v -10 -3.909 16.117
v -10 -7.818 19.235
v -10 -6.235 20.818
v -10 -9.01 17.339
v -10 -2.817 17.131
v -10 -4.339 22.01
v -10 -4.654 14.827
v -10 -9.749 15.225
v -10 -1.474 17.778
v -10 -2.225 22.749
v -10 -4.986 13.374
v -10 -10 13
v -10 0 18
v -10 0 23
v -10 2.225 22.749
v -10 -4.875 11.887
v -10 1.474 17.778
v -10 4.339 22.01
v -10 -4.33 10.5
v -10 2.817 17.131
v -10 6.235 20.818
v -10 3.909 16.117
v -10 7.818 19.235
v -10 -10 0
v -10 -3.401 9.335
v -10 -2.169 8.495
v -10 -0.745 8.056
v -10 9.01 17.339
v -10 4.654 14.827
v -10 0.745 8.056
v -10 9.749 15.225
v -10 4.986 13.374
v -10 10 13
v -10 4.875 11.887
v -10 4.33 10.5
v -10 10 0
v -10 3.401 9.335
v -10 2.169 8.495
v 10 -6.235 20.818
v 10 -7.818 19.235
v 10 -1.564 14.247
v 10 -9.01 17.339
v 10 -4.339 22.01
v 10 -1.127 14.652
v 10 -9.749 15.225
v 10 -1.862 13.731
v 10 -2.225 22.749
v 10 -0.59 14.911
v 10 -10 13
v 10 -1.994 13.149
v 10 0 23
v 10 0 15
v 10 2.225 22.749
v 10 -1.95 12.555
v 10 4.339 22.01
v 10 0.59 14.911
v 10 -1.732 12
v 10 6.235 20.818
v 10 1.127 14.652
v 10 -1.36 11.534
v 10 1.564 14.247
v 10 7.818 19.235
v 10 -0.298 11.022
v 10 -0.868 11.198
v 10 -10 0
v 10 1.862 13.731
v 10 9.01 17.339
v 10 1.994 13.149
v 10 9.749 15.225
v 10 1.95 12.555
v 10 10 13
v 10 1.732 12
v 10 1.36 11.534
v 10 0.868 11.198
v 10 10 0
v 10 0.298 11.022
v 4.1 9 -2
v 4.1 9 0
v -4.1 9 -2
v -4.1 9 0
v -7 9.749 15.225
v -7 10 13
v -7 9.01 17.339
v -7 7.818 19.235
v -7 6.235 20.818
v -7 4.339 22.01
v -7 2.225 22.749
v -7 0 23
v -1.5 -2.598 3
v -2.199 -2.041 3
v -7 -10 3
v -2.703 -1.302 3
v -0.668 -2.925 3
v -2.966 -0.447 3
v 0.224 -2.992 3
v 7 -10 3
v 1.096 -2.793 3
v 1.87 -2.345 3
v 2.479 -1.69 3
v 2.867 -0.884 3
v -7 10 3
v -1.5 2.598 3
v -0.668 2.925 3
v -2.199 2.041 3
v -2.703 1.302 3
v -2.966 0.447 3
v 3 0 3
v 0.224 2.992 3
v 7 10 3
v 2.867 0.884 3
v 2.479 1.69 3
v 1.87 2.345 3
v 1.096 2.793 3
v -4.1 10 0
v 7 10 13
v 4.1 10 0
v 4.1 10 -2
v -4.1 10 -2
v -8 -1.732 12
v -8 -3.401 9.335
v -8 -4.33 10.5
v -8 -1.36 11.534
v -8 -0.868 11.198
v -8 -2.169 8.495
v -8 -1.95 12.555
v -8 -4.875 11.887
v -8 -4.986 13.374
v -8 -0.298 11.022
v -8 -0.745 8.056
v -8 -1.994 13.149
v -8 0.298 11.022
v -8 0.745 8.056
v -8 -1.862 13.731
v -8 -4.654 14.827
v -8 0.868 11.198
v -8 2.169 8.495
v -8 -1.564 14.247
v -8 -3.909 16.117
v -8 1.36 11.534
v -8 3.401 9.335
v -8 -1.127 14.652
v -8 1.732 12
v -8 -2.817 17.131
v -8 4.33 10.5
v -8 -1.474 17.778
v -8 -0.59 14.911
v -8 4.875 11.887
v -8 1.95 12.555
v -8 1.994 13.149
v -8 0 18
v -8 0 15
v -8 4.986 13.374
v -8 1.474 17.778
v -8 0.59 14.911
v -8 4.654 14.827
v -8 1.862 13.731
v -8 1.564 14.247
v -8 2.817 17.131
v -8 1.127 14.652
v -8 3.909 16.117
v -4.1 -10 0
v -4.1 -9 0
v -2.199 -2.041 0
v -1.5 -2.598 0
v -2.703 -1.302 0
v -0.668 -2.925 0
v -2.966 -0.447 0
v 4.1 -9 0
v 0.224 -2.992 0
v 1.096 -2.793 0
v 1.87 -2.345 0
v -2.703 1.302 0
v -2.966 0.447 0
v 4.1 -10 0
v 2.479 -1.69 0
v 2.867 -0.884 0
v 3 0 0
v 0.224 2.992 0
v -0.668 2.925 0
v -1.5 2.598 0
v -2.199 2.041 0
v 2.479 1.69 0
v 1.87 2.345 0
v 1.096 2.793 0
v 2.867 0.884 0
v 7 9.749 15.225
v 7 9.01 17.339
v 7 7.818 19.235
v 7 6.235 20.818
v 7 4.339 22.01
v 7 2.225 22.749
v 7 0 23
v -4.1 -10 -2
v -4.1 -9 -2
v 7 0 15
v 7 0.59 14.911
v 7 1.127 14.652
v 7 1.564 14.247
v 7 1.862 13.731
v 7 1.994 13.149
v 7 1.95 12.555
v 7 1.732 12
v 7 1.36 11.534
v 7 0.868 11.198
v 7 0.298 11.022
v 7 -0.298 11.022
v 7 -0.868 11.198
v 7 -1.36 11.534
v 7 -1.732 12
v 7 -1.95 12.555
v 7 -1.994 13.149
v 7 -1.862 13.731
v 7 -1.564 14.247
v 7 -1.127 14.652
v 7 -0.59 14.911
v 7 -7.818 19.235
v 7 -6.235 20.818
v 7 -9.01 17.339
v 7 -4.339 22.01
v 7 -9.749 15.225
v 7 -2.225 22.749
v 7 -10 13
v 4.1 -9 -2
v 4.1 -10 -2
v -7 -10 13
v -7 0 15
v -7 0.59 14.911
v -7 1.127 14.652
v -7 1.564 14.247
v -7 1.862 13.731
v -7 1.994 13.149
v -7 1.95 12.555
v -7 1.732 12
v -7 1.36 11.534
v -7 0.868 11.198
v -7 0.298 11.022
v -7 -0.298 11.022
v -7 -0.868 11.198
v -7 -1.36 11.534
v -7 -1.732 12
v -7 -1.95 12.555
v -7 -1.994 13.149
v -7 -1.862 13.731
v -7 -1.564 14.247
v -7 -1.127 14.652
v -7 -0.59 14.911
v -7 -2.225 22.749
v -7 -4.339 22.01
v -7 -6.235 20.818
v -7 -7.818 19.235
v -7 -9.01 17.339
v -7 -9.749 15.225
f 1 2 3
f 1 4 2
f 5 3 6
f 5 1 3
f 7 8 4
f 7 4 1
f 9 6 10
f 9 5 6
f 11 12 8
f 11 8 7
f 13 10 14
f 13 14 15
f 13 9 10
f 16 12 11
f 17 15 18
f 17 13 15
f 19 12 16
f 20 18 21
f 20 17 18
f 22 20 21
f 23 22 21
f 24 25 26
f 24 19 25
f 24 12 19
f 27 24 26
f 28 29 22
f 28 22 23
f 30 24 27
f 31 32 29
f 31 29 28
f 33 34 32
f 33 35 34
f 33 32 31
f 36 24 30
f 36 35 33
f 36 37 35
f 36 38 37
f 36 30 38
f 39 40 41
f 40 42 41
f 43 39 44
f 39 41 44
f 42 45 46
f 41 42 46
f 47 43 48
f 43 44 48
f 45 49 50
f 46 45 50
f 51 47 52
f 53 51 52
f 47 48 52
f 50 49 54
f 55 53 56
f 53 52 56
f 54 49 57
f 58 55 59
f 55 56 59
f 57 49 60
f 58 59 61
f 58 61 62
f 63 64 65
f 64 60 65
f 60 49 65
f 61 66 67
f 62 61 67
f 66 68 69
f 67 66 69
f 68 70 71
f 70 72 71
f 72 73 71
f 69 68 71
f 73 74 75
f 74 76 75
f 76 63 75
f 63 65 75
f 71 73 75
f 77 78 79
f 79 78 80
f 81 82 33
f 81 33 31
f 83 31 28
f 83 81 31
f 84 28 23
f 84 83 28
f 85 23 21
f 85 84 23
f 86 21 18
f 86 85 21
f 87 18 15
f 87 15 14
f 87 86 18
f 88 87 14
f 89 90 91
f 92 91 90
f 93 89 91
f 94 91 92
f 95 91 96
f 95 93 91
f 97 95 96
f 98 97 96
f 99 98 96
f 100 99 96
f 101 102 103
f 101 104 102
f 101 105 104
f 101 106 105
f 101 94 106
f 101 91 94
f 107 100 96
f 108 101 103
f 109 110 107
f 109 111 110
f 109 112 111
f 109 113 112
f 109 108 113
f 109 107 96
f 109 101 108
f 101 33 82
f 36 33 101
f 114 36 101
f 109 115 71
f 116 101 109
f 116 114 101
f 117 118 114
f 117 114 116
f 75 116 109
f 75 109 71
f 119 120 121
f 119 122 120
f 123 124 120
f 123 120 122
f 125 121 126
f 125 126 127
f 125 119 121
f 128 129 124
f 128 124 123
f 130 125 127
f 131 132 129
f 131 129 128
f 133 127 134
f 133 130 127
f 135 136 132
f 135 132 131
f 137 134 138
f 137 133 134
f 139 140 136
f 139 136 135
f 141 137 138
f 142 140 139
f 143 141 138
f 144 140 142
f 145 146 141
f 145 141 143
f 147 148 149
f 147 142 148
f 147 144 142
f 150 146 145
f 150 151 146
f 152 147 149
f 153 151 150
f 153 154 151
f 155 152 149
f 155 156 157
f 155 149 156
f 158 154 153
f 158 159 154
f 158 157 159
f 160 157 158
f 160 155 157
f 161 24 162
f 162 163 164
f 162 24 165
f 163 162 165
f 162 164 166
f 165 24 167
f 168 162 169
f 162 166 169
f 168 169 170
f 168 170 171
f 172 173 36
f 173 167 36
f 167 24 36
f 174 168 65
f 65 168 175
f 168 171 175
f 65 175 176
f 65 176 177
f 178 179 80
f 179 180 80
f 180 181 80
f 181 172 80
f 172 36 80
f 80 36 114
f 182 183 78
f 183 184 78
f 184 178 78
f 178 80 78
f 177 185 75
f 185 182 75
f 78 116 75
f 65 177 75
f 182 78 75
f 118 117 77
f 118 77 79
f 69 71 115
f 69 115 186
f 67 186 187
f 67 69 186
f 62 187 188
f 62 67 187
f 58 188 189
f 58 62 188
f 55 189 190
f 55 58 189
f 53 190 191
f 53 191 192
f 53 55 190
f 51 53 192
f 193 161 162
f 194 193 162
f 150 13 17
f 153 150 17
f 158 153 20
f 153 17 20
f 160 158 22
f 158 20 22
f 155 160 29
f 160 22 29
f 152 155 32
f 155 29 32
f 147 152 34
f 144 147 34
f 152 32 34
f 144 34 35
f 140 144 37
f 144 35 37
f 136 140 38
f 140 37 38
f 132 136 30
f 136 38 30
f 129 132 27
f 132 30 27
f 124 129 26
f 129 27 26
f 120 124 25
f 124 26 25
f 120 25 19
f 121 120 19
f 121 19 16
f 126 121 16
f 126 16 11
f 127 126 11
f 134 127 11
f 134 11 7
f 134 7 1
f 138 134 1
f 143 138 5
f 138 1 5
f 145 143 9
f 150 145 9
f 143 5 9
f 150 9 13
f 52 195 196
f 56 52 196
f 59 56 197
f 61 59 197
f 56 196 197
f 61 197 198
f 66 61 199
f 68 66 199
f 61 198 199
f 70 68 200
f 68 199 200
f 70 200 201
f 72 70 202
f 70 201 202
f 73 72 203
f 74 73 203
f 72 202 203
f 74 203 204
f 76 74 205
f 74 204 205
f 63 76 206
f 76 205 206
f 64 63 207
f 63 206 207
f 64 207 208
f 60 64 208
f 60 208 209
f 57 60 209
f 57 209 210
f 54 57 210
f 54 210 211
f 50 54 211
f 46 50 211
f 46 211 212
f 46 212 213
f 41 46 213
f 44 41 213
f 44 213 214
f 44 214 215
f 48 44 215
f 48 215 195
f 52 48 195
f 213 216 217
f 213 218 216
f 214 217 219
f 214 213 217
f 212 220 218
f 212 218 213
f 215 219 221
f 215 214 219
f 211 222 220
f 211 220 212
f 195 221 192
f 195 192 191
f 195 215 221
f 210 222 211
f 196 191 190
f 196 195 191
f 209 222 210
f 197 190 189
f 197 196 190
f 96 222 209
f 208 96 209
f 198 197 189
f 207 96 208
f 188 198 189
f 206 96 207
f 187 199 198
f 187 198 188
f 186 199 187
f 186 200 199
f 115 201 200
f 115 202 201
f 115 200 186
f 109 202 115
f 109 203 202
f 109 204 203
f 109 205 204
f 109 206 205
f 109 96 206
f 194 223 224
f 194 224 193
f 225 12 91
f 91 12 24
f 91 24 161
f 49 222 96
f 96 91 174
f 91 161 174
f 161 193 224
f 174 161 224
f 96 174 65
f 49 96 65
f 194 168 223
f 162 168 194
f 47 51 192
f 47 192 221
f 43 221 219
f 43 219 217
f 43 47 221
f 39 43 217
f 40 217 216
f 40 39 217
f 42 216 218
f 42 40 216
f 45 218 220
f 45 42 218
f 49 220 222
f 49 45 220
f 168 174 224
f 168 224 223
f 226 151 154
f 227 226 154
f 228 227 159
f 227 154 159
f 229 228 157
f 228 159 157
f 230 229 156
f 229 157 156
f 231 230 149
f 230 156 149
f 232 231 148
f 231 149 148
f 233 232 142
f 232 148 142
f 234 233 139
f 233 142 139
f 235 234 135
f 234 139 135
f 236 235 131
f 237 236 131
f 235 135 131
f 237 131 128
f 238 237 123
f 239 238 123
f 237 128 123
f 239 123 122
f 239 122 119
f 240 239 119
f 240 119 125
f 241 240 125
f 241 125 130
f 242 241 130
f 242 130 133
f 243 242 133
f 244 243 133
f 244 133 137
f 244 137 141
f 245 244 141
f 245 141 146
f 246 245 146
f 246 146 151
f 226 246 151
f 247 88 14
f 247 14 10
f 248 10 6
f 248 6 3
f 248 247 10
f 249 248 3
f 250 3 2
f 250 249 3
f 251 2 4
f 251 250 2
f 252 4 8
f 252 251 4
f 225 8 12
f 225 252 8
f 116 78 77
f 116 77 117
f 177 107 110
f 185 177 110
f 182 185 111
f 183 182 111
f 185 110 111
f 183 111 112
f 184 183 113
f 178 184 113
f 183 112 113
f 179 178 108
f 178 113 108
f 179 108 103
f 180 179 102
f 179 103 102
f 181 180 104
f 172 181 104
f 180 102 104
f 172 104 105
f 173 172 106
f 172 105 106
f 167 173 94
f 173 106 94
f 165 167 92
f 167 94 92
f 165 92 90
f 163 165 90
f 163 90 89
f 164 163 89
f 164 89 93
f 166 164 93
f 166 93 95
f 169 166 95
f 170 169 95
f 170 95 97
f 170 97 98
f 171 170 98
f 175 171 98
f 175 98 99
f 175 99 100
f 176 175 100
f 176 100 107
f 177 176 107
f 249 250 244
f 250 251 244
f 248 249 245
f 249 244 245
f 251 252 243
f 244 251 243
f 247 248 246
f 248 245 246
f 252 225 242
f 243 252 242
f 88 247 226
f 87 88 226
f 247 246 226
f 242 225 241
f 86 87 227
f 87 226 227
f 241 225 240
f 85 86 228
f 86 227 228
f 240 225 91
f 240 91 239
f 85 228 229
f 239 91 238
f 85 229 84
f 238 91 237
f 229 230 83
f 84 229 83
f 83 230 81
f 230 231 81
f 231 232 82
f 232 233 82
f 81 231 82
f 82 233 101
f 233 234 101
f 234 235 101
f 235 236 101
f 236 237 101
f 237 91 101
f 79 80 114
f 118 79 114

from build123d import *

# Parameters (mm, degrees)
SKETCH_1_W          = 20
SKETCH_1_H          = 20
EXTRUDE_1_DEPTH     = 3
SKETCH_2_W          = 3
SKETCH_2_H          = 20
EXTRUDE_2_DEPTH     = 20
CUT_EXTRUDE_START   = -20
CUT_EXTRUDE_2_DEPTH = 20
SKETCH_4_R          = 2
CUT_EXTRUDE_3_DEPTH = 33.078029865
SKETCH_5_R          = 5
CUT_EXTRUDE_4_DEPTH = 2
SKETCH_6_R          = 3
CUT_EXTRUDE_5_DEPTH = 25.494897428
SKETCH_7_W          = 8.2
SKETCH_7_H          = 1
EXTRUDE_3_DEPTH     = 2


# Read off the part's stored shape, not the designer's step: 切除-拉伸2
with BuildPart() as part:
    # 草图1 → 凸台-拉伸1 (new body)
    with BuildSketch(Plane.XY):
        Rectangle(SKETCH_1_W, SKETCH_1_H)
    extrude(amount=EXTRUDE_1_DEPTH)

    # 草图2 → 凸台-拉伸2 (add)
    with BuildSketch(Plane.XY.offset(3)):
        with Locations((-8.5, 0)):
            Rectangle(SKETCH_2_W, SKETCH_2_H)
        with Locations((8.5, 0)):
            Rectangle(SKETCH_2_W, SKETCH_2_H)
    extrude(amount=EXTRUDE_2_DEPTH)

    # 切除-拉伸2 outline → 切除-拉伸2 (cut)
    with BuildSketch(Plane.ZY.offset(10).offset(CUT_EXTRUDE_START)):
        with BuildLine():
            Line((23, 10), (13, 10))
            ThreePointArc((13, 10), (20.071067812, 7.071067812), (23, 0))
            Line((23, 0), (23, 10))
        make_face()
        with BuildLine():
            Line((23, -10), (23, 0))
            ThreePointArc((23, 0), (20.071067812, -7.071067812), (13, -10))
            Line((13, -10), (23, -10))
        make_face()
    extrude(amount=CUT_EXTRUDE_2_DEPTH, mode=Mode.SUBTRACT)

    # 草图4 → 切除-拉伸3 (cut, through all)
    with BuildSketch(Plane.ZY.offset(10)):
        with Locations((13, 0)):
            Circle(SKETCH_4_R)
    extrude(amount=-CUT_EXTRUDE_3_DEPTH, mode=Mode.SUBTRACT)

    # 草图5 → 切除-拉伸4 (cut)
    with BuildSketch(Plane.ZY.offset(10)):
        with Locations((13, 0)):
            Circle(SKETCH_5_R)
    extrude(amount=-CUT_EXTRUDE_4_DEPTH, mode=Mode.SUBTRACT)

    # 草图6 → 切除-拉伸5 (cut, through all)
    with BuildSketch(Plane.XY.offset(3)):
        Circle(SKETCH_6_R)
    extrude(amount=-CUT_EXTRUDE_5_DEPTH, mode=Mode.SUBTRACT)

    # 草图7 → 凸台-拉伸3 (add)
    with BuildSketch(Plane(origin=(0, 0, 0), x_dir=(-1, 0, 0), z_dir=(0, 0, -1))):
        with Locations((0, 9.5)):
            Rectangle(SKETCH_7_W, SKETCH_7_H)
        with Locations((0, -9.5)):
            Rectangle(SKETCH_7_W, SKETCH_7_H)
    extrude(amount=EXTRUDE_3_DEPTH)


solid = part.part
